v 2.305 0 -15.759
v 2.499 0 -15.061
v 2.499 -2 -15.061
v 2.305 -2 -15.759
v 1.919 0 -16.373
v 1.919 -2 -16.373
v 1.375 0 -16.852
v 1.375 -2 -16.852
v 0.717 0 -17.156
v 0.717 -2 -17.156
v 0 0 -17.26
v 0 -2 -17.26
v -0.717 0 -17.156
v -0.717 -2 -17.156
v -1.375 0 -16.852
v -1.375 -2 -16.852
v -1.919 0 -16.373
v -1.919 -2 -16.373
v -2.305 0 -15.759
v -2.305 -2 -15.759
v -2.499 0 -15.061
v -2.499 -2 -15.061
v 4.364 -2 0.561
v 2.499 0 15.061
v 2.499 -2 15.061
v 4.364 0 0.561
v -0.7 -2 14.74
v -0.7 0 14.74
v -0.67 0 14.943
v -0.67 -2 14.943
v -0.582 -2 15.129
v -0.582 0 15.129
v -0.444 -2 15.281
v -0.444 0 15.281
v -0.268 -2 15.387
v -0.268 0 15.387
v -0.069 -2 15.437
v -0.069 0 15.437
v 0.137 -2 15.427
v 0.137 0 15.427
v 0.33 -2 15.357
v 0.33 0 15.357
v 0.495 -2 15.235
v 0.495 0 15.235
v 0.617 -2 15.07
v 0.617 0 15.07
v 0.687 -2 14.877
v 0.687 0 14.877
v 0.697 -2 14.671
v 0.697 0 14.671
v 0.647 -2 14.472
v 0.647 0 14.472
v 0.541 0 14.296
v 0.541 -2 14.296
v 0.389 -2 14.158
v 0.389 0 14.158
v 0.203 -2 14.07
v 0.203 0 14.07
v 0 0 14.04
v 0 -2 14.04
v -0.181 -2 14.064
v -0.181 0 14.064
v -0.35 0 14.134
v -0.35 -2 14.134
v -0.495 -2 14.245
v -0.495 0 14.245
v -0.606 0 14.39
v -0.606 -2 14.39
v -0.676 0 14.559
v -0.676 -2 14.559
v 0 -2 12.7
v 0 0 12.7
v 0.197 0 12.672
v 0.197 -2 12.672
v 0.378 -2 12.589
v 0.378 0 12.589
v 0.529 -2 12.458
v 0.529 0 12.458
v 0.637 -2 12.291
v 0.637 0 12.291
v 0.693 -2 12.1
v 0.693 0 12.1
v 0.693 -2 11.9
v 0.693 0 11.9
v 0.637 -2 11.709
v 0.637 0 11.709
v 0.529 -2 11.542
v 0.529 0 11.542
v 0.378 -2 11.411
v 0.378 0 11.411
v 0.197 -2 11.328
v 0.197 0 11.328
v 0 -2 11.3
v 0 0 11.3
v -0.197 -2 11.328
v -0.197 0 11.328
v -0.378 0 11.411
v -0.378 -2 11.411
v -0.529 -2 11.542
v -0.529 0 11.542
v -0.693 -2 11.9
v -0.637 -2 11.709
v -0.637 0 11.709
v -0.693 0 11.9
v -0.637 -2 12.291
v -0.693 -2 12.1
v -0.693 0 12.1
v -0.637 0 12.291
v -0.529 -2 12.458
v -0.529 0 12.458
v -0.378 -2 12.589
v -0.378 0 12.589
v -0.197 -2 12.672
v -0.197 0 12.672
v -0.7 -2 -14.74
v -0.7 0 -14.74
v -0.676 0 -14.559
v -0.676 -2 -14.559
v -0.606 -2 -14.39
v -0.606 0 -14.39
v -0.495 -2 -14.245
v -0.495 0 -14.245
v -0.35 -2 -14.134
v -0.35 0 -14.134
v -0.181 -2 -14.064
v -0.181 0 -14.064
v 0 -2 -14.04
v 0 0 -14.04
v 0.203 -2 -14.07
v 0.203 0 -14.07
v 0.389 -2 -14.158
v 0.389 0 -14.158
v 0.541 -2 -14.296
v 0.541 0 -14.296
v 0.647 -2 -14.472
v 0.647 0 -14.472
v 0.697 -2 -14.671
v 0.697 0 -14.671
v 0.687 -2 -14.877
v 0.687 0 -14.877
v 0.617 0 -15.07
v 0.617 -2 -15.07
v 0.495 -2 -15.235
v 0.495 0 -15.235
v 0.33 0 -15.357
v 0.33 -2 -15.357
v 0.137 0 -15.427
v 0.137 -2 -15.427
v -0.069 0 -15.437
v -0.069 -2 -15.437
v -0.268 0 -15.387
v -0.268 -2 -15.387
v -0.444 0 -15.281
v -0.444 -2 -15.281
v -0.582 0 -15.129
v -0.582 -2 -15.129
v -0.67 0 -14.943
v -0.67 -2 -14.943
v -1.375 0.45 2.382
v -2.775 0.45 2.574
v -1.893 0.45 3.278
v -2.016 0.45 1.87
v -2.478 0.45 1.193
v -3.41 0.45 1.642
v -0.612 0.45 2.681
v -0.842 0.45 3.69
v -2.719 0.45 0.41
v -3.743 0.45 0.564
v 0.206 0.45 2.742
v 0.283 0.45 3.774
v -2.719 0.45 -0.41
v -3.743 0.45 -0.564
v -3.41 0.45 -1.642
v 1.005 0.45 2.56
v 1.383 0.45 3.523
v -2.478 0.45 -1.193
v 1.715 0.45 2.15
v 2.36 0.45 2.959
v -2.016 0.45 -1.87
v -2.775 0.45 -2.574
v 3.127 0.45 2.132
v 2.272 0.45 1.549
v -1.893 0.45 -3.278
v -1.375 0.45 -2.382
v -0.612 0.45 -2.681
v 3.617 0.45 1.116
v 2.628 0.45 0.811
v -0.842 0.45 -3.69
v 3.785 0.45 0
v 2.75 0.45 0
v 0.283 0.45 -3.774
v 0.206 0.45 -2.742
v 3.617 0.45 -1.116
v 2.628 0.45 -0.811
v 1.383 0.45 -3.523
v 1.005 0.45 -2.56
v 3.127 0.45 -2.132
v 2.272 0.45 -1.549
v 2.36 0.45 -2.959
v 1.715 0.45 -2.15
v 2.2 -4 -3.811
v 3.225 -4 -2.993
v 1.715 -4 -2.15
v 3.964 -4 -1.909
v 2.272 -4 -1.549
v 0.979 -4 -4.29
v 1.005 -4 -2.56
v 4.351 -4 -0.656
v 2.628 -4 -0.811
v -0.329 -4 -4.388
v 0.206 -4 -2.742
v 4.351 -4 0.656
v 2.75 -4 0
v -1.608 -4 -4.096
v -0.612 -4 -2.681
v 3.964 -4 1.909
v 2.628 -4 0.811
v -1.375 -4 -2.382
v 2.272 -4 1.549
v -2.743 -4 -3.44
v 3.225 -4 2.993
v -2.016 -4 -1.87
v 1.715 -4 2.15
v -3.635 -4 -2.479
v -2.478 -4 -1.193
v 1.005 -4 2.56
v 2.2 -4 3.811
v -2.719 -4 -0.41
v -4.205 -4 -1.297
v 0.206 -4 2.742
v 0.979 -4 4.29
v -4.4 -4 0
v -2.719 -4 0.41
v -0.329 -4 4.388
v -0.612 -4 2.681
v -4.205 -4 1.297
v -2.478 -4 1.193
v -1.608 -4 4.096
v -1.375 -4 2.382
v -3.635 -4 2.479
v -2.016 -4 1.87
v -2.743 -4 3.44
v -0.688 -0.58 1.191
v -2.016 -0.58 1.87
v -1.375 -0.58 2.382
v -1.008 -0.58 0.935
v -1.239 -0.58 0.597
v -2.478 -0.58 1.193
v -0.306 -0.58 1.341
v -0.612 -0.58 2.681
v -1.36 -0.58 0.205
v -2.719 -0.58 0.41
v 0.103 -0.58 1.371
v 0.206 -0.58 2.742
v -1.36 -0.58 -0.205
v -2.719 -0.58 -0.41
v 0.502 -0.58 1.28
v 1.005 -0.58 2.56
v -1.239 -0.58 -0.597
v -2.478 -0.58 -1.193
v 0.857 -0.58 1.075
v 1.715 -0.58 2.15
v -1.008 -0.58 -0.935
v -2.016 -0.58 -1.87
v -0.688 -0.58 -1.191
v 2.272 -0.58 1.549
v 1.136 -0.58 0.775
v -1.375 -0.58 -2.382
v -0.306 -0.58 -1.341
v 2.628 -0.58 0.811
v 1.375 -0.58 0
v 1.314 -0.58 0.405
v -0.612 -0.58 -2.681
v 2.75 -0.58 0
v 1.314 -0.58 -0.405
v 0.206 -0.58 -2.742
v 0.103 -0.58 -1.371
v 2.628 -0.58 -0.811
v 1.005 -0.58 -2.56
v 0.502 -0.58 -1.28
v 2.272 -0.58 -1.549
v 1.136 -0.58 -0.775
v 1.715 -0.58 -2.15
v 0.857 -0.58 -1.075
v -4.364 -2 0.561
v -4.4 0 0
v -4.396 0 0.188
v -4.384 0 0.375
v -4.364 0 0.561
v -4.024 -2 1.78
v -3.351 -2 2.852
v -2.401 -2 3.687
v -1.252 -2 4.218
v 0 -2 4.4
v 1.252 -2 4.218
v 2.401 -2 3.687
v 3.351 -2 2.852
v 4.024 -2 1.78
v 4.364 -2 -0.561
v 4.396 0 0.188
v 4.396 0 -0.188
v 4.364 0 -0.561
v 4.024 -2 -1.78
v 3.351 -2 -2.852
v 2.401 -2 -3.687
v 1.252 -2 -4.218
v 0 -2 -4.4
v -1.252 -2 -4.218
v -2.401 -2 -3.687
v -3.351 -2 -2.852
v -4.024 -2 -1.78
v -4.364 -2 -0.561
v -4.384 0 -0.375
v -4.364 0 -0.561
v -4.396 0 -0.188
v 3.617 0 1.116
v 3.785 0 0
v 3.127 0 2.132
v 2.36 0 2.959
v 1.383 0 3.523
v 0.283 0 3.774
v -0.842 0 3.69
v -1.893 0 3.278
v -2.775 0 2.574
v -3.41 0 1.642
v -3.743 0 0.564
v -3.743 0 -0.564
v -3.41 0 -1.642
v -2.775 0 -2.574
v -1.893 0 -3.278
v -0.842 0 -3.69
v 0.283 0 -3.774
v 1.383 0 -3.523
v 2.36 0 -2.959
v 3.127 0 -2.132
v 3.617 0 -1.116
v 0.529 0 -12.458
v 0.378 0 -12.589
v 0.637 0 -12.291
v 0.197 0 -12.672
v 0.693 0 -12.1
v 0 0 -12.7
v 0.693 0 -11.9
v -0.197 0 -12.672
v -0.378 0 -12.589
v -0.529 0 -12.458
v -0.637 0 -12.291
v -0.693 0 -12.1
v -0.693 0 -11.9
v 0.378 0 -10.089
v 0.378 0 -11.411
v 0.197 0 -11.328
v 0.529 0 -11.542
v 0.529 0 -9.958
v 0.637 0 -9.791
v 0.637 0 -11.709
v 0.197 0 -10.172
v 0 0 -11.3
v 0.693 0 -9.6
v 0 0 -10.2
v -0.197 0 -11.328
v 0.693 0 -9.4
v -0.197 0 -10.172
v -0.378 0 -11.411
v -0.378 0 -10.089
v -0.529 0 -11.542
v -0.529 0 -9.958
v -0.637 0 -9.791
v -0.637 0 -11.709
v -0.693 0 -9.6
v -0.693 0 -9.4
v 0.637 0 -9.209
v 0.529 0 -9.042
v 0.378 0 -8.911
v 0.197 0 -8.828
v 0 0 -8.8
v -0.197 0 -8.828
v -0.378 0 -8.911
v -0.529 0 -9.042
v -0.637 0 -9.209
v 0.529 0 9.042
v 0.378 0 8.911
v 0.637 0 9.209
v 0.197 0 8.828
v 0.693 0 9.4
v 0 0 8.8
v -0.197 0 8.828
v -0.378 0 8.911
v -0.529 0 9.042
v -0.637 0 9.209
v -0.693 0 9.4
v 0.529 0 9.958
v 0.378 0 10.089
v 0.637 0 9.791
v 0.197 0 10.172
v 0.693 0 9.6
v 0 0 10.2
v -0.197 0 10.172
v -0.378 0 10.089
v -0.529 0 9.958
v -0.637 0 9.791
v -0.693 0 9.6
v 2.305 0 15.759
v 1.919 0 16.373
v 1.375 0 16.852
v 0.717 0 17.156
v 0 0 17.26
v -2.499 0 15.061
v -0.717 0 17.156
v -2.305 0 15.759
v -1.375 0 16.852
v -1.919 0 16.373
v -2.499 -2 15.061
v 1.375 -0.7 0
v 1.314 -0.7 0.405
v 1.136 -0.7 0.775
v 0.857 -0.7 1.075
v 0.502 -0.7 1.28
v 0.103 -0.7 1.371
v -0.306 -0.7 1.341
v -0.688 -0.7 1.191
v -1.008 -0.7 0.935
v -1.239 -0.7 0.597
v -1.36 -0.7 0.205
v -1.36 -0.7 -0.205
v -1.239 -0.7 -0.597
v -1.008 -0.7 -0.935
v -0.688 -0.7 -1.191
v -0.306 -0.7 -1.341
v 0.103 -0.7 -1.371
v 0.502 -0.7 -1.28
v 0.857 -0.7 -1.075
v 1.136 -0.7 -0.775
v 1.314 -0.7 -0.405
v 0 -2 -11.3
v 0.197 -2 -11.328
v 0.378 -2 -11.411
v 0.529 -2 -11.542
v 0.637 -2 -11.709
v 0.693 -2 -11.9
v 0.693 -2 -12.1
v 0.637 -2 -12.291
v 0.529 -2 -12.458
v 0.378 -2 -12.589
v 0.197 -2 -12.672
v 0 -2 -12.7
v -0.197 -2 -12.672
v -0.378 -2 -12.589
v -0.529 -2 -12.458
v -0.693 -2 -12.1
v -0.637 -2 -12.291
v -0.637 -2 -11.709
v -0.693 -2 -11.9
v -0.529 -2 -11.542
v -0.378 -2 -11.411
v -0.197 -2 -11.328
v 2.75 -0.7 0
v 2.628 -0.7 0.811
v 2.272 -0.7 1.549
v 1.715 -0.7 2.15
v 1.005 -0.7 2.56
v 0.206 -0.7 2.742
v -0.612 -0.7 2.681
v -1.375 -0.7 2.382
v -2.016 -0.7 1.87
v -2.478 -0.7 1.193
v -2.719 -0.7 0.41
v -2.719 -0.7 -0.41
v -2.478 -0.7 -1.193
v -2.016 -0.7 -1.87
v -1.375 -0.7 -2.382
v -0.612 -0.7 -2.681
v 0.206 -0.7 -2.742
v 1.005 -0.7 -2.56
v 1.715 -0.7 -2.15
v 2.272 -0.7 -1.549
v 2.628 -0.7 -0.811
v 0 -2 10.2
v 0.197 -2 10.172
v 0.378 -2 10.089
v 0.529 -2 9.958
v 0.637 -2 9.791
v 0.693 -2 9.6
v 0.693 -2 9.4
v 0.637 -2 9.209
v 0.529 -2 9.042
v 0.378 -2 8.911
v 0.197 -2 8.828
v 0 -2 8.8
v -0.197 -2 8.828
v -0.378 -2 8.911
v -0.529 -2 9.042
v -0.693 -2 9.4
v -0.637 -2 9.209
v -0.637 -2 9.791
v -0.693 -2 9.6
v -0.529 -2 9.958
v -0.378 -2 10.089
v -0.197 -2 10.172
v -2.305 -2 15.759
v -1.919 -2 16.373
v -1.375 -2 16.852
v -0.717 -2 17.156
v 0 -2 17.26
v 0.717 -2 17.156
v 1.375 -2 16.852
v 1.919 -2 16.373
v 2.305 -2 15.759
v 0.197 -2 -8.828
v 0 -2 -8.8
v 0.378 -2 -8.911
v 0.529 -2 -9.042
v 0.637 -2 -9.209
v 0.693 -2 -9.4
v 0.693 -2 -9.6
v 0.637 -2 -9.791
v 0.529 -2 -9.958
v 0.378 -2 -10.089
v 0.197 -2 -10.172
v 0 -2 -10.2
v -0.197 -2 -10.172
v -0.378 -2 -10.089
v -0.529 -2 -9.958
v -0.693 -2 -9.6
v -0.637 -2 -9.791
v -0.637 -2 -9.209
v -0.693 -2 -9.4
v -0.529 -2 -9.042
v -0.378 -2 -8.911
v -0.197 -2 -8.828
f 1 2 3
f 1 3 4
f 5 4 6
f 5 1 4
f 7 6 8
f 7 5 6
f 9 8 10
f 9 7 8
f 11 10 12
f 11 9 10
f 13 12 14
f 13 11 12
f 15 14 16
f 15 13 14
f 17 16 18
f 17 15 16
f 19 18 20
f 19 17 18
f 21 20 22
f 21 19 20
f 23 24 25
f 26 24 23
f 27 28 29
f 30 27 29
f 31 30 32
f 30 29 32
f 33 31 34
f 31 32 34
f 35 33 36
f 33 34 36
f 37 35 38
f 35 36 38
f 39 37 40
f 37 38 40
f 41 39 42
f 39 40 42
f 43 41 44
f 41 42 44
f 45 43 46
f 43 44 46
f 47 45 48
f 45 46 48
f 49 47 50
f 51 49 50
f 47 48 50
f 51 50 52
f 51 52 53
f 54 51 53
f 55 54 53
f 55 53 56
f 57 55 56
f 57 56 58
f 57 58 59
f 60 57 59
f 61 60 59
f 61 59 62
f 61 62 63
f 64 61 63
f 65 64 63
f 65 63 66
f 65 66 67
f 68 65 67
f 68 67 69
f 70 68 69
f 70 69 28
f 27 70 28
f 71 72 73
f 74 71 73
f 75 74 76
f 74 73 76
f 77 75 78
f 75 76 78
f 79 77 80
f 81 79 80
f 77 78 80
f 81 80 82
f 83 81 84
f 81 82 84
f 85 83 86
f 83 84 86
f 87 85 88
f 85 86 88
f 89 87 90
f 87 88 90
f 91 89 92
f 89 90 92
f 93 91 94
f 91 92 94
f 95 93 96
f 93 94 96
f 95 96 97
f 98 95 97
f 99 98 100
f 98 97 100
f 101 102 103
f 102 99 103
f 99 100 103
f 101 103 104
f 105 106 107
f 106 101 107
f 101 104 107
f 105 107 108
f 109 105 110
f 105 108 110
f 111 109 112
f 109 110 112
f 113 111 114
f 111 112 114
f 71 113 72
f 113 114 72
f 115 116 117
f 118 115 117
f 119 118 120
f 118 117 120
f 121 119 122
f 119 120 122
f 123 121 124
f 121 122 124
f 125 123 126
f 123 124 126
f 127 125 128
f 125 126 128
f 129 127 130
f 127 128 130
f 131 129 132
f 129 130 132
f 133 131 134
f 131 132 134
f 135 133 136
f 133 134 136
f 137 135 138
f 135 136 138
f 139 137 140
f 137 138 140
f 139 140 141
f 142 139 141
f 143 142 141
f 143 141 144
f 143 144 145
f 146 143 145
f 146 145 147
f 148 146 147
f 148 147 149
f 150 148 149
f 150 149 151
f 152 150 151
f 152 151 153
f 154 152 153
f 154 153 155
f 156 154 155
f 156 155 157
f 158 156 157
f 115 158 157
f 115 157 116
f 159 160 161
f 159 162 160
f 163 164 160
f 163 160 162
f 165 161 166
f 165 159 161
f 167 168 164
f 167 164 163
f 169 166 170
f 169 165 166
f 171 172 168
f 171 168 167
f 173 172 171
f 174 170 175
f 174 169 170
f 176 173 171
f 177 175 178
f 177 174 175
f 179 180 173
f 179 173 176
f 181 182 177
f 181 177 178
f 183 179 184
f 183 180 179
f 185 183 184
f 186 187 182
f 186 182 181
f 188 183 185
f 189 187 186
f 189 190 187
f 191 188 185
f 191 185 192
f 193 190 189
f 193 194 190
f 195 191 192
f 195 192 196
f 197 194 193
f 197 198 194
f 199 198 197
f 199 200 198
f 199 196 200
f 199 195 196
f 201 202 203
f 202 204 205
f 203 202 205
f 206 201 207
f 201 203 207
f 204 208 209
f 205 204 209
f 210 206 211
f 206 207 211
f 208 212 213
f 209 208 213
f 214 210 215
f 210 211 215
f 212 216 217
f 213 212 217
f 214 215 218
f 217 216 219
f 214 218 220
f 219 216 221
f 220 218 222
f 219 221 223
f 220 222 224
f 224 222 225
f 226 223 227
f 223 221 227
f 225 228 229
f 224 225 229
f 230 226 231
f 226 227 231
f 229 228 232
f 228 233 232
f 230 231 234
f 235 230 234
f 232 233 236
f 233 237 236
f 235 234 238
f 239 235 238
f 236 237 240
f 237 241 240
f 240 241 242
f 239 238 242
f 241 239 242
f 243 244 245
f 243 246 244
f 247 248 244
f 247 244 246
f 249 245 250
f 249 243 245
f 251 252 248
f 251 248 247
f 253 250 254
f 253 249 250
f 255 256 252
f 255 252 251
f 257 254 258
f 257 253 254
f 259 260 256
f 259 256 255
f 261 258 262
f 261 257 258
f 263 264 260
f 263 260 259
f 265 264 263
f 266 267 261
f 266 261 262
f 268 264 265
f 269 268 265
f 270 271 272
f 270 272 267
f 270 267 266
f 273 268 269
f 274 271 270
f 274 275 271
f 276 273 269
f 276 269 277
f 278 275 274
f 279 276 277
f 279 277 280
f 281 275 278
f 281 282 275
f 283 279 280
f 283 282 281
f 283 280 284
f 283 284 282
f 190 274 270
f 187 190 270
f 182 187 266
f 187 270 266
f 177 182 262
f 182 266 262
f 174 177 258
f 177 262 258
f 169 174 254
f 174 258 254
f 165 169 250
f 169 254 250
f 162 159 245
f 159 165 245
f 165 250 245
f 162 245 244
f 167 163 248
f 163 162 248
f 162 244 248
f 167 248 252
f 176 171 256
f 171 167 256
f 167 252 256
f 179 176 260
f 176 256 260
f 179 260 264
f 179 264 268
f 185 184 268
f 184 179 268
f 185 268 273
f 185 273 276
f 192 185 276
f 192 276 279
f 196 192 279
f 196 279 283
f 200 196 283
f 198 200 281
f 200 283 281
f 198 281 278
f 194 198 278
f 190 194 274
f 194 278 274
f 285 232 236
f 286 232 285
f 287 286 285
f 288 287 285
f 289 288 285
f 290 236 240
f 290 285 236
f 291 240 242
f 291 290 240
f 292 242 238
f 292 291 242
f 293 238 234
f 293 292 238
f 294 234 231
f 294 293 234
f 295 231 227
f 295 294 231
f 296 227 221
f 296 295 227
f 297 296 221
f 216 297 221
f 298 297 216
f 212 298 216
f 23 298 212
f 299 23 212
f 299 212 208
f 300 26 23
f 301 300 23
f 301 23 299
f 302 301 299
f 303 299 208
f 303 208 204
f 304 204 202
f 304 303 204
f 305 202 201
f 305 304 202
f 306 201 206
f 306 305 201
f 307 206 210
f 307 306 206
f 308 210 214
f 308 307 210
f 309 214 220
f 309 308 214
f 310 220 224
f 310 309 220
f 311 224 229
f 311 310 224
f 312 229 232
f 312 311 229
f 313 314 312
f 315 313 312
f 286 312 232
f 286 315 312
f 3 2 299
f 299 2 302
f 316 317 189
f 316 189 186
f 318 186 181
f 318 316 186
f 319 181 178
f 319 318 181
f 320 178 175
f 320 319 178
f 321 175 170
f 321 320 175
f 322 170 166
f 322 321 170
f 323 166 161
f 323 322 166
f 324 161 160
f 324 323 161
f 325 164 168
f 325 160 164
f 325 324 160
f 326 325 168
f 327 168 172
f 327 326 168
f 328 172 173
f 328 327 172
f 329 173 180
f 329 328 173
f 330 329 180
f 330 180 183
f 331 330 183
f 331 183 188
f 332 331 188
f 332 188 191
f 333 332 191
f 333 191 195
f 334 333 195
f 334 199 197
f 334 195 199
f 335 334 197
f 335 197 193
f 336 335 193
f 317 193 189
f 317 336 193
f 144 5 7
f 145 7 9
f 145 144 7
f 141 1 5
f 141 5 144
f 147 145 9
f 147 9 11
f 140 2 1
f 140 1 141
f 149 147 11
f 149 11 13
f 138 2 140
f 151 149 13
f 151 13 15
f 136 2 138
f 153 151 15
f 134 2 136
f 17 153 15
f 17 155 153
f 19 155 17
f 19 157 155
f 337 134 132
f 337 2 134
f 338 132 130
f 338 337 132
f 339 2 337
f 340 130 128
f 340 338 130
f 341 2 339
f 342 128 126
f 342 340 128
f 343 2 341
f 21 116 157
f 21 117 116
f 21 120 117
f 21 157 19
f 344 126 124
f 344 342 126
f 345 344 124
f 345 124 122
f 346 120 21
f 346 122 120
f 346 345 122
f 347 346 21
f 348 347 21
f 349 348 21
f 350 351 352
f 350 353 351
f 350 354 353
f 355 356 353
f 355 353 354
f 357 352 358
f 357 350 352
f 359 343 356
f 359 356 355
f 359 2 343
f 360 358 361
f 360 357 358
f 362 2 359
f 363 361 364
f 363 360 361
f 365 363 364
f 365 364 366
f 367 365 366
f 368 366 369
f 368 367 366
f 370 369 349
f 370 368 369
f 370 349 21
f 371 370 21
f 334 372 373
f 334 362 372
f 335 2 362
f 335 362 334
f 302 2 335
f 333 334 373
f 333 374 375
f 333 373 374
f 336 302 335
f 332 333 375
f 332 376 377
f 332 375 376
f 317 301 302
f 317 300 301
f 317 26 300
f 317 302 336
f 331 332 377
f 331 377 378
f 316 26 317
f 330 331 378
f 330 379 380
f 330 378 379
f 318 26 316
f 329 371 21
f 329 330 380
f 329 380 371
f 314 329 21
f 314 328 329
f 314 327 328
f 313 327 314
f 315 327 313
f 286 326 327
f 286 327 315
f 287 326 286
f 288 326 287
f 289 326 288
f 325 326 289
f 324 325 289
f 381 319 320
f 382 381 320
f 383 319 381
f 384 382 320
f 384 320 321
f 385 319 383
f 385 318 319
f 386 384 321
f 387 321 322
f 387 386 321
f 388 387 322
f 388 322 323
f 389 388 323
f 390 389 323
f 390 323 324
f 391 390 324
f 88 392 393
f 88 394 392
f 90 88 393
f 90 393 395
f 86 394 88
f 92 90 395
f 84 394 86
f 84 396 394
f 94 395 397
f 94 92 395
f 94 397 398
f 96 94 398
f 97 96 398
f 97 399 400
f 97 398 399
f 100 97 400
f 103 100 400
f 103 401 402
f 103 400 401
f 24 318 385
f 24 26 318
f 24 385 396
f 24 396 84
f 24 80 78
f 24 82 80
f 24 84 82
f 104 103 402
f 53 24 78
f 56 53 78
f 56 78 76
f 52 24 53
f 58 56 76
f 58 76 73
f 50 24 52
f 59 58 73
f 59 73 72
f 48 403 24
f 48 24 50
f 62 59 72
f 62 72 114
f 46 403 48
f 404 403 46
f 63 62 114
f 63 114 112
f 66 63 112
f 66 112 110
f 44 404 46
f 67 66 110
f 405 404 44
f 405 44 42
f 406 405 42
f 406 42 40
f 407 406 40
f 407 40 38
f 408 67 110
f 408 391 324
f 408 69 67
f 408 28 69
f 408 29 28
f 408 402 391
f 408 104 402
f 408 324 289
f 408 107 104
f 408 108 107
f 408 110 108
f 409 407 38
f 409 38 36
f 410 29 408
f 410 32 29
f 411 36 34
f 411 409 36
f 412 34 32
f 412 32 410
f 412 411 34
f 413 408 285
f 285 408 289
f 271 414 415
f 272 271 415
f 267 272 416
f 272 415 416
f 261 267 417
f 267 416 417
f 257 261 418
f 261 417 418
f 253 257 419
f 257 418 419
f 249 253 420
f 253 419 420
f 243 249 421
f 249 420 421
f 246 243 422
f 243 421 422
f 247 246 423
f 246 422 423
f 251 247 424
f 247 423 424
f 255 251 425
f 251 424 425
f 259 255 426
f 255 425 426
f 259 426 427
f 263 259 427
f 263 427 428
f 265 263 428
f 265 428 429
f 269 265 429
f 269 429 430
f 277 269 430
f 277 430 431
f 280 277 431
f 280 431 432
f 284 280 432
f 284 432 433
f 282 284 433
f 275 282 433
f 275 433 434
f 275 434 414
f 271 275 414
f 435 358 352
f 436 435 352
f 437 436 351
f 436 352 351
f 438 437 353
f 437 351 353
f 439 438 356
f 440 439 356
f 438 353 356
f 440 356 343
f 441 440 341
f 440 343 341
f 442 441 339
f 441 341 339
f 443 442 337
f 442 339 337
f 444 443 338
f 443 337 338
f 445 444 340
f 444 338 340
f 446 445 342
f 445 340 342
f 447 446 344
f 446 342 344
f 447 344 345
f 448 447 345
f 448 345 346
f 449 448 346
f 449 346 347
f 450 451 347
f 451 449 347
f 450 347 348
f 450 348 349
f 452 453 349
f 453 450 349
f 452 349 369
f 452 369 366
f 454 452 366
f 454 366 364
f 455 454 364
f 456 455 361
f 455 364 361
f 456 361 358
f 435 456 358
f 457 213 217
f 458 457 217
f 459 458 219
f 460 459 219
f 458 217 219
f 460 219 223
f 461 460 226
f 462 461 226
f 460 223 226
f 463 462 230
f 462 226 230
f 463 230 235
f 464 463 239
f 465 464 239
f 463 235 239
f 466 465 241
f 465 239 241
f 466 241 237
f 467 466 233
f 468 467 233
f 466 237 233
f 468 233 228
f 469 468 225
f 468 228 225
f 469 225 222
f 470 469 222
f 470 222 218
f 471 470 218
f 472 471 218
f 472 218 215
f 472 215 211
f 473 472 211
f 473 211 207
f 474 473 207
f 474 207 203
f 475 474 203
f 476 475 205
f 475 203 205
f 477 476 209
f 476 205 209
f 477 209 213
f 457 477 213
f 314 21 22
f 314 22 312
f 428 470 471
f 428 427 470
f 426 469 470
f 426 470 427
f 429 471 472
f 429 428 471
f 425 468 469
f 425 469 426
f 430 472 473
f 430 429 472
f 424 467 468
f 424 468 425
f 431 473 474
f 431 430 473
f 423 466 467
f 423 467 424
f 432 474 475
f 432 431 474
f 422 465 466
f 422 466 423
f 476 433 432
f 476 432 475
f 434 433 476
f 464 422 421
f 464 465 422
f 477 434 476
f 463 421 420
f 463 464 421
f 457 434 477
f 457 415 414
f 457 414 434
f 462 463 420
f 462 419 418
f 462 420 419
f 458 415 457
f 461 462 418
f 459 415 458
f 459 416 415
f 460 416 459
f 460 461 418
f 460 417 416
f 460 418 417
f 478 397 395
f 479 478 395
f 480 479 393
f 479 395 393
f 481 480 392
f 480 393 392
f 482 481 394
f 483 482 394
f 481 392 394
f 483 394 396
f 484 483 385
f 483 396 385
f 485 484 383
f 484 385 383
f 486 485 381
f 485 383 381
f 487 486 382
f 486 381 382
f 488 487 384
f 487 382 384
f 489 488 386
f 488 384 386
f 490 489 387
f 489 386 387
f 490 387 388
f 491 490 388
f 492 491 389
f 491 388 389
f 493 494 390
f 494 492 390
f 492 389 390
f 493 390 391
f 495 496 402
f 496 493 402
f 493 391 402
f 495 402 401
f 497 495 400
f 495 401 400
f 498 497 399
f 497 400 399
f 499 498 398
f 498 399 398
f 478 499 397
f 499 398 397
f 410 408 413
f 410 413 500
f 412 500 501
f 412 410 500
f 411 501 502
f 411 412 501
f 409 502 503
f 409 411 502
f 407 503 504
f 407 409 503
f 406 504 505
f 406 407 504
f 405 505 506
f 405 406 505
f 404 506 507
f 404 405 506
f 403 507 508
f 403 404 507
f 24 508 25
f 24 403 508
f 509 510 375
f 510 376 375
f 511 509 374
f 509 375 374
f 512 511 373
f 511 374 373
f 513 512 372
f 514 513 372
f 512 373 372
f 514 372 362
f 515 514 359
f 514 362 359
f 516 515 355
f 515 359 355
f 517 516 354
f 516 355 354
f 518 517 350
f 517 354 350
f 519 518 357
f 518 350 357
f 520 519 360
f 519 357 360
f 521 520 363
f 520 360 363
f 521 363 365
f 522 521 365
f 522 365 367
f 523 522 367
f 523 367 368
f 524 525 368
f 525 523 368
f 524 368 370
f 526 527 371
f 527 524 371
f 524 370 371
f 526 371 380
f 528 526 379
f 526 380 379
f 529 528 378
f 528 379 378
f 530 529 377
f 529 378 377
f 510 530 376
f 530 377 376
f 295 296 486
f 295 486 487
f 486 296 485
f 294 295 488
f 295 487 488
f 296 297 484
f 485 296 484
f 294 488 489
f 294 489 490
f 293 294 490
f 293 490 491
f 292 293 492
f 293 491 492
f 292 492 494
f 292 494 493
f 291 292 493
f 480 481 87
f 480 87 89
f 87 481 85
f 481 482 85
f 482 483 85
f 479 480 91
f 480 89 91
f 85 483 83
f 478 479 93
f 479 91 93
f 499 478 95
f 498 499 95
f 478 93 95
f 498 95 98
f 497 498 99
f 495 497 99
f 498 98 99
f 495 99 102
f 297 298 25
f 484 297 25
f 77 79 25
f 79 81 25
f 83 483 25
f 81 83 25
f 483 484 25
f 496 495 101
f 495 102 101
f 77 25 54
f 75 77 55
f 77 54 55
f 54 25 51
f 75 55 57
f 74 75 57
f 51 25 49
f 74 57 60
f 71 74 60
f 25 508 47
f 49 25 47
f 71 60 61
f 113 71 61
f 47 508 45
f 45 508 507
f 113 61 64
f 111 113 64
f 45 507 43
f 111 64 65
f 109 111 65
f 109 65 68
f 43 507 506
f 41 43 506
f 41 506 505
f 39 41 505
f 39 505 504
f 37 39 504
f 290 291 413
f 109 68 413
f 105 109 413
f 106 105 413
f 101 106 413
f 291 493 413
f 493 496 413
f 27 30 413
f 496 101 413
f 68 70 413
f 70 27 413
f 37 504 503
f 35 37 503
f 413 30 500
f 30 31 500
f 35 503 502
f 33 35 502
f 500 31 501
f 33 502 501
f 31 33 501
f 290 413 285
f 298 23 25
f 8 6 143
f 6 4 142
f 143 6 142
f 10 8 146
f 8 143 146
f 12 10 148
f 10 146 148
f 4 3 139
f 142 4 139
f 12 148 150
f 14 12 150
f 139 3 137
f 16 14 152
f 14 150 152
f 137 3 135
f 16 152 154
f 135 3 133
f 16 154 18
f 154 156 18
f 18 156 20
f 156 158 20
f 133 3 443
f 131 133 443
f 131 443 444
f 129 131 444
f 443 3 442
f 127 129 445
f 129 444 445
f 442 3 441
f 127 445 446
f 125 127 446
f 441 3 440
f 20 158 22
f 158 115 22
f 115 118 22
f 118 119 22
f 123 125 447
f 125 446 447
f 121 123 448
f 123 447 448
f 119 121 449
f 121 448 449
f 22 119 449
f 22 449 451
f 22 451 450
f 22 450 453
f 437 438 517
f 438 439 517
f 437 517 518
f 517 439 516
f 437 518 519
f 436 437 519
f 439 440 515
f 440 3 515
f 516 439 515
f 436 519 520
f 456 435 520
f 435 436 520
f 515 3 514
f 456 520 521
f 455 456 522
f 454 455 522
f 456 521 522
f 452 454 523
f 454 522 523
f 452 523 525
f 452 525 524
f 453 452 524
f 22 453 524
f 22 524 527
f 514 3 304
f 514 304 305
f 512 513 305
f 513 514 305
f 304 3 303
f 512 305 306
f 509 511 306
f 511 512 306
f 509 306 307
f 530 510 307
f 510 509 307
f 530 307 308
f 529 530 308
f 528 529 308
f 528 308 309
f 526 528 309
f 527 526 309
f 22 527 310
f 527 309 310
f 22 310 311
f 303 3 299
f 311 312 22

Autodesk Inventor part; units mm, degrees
ref_plane "YZ Plane" through (0, 0, 0) normal (1, 0, 0) x (0, 1, 0)
ref_plane "XZ Plane" through (0, 0, 0) normal (0, 1, 0) x (-1, 0, 0)
ref_plane "XY Plane" through (0, 0, 0) normal (0, 0, 1) x (1, 0, 0)
sketch "Sketch1" plane through (0, 0, 0) normal (0, 1, 0) x (-1, 0, 0)
  circle A0 centre (0, 0) radius 4.4
  line L0 (9.1763, 0) -> (-11.3805, 0)
  line L1 (0, 0) -> (0, -9.5)
  line L2 (0, -9.5) -> (0, -12)
  line L3 (0, -12) -> (0, -14.74)
  circle A1 centre (0, -9.5) radius 0.7
  circle A2 centre (0, -12) radius 0.7
  circle A3 centre (0, -14.74) radius 0.7
  arc A4 (-2.4994, -15.0614) -> (2.4994, -15.0614) centre (0, -14.74) ccw
  line L4 (2.4994, -15.0614) -> (4.3641, -0.5612)
  line L5 (-2.4994, -15.0614) -> (-4.3641, -0.5612)
  line L6 (0, 0) -> (0, 9.5)
  line L7 (0, 9.5) -> (0, 12)
  line L8 (0, 12) -> (0, 14.74)
  circle A5 centre (0, 9.5) radius 0.7
  circle A6 centre (0, 12) radius 0.7
  circle A7 centre (0, 14.74) radius 0.7
  arc A8 (2.4994, 15.0614) -> (-2.4994, 15.0614) centre (0, 14.74) ccw
  line L9 (2.4994, 15.0614) -> (4.3641, 0.5612)
  line L10 (-2.4994, 15.0614) -> (-4.3641, 0.5612)
  point P0 (4.3641, 0.5612)
  dimension "d0" = 8.8
  dimension "d2" = 9.5
  dimension "d3" = 2.5
  dimension "d4" = 2.74
  dimension "d5" = 1.4
  dimension "d6" = 1.4
  dimension "d7" = 1.4
  dimension "d8" = 5.04
extrude "Extrusion1" add sketch "Sketch1" against normal blind 2 contours A0 L10 A8 L9 | L4 A4 L5 A0
extrude "Extrusion2" add sketch "Sketch1" against normal blind 4 contours L0 L6 A0 | A0 L1 L0 | L1 A0 L0 | L0 A0 L6
sketch "Sketch2" plane through (0, 0, 0) normal (0, 1, 0) x (1, 0, 0)
  circle A0 centre (0, 0) radius 3.785
  circle A1 centre (0, 0) radius 2.75
  dimension "d13" = 7.57
  dimension "d14" = 5.5
extrude "Extrusion3" add sketch "Sketch2" along normal blind 0.45
extrude "Extrusion4" cut sketch "Sketch2" against normal blind 0.58 contours A1
sketch "Sketch3" plane through (0, -4, 0) normal (0, -1, 0) x (1, 0, 0)
  circle A0 centre (0, 0) radius 2.75
  circle A1 centre (0, 0) radius 1.375
  dimension "d19" = 5.5
  dimension "d20" = 2.75
extrude "Extrusion5" cut sketch "Sketch3" against normal through all contours A1
extrude "Extrusion6" cut sketch "Sketch3" against normal blind 3.3
properties part number "MMAE 232 CAD Assignment 2 Servo Horn 6-Nicholas Skiba"
